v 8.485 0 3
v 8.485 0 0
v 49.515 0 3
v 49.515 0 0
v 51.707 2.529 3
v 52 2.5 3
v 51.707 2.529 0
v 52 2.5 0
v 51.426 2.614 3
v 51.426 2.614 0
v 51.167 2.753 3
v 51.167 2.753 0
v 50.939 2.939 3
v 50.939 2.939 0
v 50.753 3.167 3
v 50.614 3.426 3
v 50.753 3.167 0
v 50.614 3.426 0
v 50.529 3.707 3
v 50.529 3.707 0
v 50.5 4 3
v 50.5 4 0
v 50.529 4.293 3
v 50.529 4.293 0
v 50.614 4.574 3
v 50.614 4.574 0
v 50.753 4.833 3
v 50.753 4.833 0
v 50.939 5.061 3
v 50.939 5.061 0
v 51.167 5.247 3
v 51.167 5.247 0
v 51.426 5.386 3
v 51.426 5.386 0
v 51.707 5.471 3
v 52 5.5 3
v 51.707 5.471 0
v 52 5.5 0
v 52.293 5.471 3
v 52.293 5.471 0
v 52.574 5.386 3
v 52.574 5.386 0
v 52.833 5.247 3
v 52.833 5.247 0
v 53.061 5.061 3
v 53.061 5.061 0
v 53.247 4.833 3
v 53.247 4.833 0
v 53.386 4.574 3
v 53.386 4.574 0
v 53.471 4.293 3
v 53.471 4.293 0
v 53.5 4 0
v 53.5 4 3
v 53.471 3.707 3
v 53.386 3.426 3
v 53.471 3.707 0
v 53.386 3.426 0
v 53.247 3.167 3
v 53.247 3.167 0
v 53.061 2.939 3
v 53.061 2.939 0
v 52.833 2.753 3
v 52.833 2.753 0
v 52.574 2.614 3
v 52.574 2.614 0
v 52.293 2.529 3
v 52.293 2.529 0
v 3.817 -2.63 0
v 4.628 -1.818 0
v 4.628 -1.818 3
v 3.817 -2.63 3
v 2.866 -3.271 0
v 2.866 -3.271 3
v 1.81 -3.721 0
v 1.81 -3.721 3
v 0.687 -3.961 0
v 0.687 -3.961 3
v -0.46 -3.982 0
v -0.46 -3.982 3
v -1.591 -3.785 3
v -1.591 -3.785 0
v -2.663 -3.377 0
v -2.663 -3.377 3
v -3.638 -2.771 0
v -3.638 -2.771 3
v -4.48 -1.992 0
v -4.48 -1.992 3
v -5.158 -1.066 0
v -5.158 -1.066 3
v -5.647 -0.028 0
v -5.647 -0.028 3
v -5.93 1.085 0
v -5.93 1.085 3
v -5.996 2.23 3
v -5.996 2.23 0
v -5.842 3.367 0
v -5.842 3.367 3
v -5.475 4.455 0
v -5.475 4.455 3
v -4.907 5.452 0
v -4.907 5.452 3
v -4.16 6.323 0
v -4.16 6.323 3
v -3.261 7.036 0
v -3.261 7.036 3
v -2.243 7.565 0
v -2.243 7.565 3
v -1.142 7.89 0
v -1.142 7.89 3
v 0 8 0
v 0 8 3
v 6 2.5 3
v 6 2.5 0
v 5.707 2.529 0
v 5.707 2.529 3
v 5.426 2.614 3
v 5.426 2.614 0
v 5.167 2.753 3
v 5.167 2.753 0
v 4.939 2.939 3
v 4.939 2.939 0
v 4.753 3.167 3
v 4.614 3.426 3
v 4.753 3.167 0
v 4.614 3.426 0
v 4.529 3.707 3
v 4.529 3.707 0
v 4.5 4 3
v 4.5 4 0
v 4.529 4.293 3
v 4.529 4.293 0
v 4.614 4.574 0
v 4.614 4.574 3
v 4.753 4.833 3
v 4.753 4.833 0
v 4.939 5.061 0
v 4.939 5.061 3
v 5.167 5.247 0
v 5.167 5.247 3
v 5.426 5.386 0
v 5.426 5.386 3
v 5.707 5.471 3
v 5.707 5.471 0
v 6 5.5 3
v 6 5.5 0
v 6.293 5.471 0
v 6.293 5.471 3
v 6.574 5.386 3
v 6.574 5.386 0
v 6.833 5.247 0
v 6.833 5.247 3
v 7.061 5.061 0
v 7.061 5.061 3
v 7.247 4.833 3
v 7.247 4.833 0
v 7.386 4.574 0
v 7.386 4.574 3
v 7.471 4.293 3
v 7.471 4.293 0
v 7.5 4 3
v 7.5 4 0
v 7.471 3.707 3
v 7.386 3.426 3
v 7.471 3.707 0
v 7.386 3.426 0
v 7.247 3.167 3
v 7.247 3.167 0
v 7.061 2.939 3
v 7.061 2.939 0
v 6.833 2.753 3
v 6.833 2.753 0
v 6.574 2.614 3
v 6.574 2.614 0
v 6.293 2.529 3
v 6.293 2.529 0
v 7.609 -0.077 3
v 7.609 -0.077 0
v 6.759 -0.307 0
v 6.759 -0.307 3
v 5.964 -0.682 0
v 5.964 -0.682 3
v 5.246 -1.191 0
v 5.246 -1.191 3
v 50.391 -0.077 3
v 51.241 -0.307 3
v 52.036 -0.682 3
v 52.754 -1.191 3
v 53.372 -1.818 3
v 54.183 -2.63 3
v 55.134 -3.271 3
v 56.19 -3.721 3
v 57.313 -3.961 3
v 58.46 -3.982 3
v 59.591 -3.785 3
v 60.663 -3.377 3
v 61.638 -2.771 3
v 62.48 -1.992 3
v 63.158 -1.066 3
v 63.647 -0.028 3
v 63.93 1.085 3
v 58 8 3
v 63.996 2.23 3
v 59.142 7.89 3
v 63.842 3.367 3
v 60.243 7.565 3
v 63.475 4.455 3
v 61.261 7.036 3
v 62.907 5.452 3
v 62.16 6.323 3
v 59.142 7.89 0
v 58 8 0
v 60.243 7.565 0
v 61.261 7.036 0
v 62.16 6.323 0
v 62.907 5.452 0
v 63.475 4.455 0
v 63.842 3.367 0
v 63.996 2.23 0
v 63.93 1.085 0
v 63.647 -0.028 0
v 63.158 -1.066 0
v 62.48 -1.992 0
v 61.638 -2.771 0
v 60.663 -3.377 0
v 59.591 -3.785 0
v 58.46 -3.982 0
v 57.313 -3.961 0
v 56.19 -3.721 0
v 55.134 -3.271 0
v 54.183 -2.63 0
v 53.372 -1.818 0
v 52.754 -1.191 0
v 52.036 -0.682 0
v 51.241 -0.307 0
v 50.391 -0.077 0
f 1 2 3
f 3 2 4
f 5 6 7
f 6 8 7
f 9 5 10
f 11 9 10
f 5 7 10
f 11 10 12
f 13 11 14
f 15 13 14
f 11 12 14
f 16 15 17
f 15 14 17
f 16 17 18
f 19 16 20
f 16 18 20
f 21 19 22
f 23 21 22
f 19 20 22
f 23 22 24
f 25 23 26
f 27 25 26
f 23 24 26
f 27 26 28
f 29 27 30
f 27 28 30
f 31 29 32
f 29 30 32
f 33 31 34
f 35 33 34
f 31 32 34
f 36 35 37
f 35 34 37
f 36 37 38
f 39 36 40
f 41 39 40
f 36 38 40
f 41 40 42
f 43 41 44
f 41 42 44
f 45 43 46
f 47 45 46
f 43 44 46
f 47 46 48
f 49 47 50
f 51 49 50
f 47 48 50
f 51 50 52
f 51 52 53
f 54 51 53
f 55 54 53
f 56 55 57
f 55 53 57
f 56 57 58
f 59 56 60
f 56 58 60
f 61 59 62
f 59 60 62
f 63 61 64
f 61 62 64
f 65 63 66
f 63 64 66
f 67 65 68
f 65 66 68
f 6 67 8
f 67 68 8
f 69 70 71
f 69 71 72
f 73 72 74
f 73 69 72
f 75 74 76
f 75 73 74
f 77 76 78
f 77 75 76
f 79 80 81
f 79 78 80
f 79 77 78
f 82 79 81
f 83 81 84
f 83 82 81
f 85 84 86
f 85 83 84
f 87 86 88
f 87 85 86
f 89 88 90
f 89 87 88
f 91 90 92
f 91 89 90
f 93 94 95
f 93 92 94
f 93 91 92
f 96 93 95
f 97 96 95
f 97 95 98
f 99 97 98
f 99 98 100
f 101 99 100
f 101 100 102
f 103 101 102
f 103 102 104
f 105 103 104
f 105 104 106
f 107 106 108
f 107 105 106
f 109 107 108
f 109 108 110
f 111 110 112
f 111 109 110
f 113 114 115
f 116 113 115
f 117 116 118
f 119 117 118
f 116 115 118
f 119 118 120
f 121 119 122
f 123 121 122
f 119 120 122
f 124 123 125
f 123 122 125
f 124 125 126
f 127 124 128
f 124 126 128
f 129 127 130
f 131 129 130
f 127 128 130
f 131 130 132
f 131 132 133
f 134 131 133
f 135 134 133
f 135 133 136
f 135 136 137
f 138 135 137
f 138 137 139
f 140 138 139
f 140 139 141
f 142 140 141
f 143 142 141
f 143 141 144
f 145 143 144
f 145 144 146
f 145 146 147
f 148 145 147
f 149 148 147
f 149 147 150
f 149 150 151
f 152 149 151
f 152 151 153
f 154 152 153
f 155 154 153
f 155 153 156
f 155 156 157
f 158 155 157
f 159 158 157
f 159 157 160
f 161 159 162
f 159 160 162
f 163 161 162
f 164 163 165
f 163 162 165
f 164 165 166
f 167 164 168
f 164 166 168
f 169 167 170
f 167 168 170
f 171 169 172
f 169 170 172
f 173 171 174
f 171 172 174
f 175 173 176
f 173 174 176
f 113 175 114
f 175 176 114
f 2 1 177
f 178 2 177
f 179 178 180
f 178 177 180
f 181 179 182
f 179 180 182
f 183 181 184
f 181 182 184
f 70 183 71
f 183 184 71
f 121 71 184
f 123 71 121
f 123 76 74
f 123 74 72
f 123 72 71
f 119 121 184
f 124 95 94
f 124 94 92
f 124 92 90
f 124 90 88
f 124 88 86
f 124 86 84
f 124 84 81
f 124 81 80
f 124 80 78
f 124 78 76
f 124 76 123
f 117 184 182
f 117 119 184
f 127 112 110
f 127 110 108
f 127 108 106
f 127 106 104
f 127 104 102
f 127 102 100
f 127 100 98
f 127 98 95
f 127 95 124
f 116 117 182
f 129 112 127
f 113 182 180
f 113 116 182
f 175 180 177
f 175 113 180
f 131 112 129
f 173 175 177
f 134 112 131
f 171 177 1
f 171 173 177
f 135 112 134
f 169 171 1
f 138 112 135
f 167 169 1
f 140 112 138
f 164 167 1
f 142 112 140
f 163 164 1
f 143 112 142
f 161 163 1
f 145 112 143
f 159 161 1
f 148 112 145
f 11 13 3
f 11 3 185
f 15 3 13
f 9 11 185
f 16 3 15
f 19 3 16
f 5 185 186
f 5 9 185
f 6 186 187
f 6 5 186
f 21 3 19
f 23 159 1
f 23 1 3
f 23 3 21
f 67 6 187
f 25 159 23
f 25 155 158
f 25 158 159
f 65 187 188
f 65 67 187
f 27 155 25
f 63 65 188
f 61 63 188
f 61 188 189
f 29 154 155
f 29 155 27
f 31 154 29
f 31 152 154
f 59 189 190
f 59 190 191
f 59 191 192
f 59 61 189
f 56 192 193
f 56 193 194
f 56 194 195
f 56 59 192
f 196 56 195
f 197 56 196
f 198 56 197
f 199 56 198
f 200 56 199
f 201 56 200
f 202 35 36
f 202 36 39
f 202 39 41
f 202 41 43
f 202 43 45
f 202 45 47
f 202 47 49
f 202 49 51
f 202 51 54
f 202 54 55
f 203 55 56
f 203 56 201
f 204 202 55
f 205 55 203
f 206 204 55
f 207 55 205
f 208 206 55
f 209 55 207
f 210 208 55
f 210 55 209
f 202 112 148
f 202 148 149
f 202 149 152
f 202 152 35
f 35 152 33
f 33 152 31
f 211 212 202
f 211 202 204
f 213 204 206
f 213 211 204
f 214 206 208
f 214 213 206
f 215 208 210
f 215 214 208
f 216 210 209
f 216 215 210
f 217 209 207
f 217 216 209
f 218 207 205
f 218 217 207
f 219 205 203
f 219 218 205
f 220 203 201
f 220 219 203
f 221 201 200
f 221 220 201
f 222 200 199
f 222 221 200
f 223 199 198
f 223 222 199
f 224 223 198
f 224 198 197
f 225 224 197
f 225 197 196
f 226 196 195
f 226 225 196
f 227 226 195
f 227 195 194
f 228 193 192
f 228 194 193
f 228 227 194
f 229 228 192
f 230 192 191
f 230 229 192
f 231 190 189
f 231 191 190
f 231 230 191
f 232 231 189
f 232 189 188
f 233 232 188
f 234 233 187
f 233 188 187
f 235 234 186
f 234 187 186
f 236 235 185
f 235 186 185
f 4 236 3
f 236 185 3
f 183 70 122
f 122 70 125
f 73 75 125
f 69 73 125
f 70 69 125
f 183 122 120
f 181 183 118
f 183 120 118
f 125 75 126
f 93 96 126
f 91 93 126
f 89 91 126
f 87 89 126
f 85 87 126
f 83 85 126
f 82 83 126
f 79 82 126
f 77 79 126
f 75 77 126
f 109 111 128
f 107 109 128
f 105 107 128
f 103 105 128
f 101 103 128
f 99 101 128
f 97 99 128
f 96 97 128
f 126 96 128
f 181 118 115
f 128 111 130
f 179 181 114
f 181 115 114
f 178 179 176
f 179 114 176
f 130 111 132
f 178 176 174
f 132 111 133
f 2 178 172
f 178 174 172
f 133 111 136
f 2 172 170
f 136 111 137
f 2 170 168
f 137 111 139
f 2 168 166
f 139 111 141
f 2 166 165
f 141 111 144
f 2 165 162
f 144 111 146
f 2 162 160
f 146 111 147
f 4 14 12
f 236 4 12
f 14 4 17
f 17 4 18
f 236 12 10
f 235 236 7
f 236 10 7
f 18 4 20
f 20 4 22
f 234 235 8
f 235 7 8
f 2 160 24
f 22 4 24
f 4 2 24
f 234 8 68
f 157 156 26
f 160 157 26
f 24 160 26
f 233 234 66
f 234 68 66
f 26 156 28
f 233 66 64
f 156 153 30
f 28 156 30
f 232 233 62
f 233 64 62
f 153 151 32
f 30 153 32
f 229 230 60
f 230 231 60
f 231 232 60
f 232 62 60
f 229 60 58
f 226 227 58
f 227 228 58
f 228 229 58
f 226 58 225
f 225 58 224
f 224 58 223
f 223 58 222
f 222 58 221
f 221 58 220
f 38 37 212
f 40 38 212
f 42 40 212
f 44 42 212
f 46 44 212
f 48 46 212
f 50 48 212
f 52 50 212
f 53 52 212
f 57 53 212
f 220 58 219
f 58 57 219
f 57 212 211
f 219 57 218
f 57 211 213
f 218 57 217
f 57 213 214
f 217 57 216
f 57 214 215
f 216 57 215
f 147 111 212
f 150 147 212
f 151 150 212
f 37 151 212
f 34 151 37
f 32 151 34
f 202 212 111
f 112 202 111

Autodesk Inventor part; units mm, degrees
ref_plane "YZ Plane" through (0, 0, 0) normal (1, 0, 0) x (0, 1, 0)
ref_plane "XZ Plane" through (0, 0, 0) normal (0, 1, 0) x (-1, 0, 0)
ref_plane "XY Plane" through (0, 0, 0) normal (0, 0, 1) x (1, 0, 0)
sketch "Sketch1" plane through (0, 0, 0) normal (0, 0, 1) x (1, 0, 0)
  line L0 (0, 0) -> (58, 0)
  line L1 (58, 0) -> (58, 8)
  line L2 (58, 8) -> (0, 8)
  line L3 (0, 8) -> (0, 0)
  circle A0 centre (0, 2) radius 6
  circle A1 centre (58, 2) radius 6
  dimension "d88" = 12
  dimension "d0" = 58
  dimension "d1" = 8
extrude "Extrusion1" add sketch "Sketch1" along normal blind 3
fillet "圓角5" radius 5 2 edges at (5.6569, 0, 1.5) (52.3431, 0, 1.5)
sketch "草圖9" plane through (0, 0, 3) normal (0, 0, 1) x (1, 0, 0)
  line L0 (0, 8) -> (58, 8) projected
  arc A0 (0, 8) -> (4.6283, -1.8182) centre (0, 2) ccw projected
  point P0 (0, 0)
  point P1 (6, 4)
  point P2 (52, 4)
  dimension "d90" = 4
  dimension "d91" = 46
  dimension "d92" = 6
hole "孔5" at (6, 4, 3) at (52, 4, 3) direction (0, 0, -1) diameter 3 end through all
properties part number "plastic_part_53"
